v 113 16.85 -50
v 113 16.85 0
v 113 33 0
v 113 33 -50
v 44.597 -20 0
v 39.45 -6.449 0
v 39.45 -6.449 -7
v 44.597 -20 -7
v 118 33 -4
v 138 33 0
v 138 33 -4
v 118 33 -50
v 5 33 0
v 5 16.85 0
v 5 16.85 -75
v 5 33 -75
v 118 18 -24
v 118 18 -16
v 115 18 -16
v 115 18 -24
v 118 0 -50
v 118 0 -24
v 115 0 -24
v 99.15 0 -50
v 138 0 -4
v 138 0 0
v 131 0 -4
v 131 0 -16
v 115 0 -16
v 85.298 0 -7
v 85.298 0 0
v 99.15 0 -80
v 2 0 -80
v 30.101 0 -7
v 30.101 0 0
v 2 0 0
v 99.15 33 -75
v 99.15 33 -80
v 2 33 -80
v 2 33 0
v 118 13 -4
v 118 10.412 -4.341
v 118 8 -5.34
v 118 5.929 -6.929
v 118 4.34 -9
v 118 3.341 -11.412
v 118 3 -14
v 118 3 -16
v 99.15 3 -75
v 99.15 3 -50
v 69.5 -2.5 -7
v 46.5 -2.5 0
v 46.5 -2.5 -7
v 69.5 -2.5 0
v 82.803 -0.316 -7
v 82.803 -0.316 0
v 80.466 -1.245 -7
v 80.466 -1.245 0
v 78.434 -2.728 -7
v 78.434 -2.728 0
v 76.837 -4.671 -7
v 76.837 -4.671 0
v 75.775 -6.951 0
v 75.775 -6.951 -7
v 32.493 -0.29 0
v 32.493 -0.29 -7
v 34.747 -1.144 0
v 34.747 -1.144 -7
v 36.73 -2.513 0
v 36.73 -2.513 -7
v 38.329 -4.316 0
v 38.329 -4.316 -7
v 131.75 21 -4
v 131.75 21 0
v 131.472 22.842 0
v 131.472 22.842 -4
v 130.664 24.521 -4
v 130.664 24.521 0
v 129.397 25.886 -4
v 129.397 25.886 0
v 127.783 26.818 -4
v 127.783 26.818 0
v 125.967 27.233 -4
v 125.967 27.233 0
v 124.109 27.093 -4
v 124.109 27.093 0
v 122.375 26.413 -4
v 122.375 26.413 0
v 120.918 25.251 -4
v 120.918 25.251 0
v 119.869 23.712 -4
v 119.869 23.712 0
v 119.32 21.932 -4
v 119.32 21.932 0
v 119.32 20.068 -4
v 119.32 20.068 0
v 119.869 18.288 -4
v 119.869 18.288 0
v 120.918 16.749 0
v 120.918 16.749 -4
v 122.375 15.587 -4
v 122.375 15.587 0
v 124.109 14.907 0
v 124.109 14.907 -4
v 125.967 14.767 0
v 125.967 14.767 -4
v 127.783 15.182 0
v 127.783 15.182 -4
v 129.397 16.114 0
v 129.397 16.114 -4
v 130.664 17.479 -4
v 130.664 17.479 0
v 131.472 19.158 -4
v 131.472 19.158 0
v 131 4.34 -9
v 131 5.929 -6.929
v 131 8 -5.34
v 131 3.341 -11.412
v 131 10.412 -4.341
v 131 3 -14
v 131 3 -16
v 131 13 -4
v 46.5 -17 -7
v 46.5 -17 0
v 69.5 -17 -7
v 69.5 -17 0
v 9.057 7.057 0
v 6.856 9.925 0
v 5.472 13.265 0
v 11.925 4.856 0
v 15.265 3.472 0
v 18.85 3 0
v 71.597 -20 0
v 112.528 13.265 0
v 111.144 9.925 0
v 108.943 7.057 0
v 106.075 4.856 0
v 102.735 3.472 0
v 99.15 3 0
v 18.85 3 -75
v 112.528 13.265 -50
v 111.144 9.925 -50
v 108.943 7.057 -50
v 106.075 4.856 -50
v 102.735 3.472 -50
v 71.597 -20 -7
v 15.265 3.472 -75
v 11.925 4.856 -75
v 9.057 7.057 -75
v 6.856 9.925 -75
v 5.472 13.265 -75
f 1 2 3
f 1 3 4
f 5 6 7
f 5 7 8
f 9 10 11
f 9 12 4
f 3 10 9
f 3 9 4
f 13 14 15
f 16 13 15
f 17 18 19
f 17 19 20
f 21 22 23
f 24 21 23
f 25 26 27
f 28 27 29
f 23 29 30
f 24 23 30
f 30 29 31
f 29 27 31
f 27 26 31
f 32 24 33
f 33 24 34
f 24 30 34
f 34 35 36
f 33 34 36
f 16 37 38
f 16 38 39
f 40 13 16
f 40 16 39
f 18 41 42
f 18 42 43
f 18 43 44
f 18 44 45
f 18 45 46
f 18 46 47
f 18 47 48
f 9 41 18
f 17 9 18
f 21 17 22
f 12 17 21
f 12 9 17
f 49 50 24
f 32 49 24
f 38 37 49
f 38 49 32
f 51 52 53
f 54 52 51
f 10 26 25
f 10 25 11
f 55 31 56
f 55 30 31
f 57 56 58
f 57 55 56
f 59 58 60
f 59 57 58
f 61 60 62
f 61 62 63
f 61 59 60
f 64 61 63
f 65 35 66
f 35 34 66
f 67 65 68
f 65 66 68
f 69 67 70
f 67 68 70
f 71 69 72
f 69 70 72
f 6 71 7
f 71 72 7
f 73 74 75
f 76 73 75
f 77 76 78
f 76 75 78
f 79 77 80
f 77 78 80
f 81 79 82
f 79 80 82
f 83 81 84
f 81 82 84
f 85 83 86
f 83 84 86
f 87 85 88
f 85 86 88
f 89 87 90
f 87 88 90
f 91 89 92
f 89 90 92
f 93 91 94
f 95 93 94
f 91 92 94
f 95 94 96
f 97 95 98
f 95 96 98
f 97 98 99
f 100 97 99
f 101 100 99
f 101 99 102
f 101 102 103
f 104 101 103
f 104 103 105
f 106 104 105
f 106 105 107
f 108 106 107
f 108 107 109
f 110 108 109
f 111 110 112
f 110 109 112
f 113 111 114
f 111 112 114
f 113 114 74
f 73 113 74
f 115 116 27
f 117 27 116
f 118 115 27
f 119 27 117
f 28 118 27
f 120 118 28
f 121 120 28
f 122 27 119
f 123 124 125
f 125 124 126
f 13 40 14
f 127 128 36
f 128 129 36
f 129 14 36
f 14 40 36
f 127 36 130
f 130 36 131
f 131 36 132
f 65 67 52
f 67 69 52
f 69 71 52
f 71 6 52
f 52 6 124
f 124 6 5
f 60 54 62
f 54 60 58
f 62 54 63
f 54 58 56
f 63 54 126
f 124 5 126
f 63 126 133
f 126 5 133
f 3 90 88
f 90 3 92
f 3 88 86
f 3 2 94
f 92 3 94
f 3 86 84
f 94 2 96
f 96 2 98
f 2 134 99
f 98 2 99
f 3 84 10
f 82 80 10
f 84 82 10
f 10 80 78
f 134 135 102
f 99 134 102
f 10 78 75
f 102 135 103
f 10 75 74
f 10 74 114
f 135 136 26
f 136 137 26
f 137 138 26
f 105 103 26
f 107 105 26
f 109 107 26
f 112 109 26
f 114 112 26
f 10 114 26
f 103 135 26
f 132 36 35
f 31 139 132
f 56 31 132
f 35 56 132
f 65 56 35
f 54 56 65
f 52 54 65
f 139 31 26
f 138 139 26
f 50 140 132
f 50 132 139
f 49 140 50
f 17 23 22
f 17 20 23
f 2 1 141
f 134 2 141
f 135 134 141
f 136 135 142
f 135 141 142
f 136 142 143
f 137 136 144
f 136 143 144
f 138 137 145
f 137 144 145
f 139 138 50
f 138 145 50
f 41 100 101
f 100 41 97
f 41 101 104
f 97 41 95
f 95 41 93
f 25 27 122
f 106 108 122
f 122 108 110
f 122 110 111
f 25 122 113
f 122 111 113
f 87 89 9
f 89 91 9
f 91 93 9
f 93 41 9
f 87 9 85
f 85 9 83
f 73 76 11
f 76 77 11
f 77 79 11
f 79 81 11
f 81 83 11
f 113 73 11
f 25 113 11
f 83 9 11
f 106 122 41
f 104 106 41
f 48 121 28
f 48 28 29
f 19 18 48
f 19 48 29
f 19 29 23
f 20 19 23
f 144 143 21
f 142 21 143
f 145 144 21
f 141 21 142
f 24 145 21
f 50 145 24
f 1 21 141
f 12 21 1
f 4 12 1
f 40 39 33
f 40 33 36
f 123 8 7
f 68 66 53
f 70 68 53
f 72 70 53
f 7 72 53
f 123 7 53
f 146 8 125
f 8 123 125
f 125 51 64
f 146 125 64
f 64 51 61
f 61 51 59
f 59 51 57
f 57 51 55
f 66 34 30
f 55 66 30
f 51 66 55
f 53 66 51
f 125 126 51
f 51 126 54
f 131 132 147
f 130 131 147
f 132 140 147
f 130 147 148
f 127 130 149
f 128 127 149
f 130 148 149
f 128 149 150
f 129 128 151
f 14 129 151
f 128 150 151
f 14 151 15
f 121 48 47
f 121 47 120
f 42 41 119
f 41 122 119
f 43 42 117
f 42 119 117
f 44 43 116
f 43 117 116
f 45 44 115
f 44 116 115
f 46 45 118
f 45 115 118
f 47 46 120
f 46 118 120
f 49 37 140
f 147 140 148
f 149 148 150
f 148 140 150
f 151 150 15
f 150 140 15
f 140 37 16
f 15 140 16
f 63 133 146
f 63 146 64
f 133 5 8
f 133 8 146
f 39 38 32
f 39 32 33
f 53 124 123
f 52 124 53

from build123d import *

# Parameters (mm, degrees)
ESQUISSE1_W             = 138
ESQUISSE1_H             = 75
BOSS_EXTRU_1_DEPTH      = 3
ESQUISSE2_W             = 5
ESQUISSE2_H             = 75
ESQUISSE2_W_2           = 25
BOSS_EXTRU_2_DEPTH      = 30
CONG_1_R                = 13.85
ESQUISSE3_W             = 138
ESQUISSE3_H             = 33
BOSS_EXTRU_3_DEPTH      = 5
ESQUISSE5_W             = 20
ESQUISSE5_H             = 76
ENL_V_MAT_EXTRU_2_DEPTH = 30
ESQUISSE6_R             = 6.25
ENL_V_MAT_EXTRU_3_DEPTH = 4
ESQUISSE7_W             = 20
ESQUISSE7_H             = 3
ENL_V_MAT_EXTRU_4_DEPTH = 30
ENL_V_MAT_EXTRU_5_REACH = 164.89
ESQUISSE8_W             = 18.85
ESQUISSE8_H             = 30
ESQUISSE10_W            = 8
ESQUISSE10_H            = 15
ENL_V_MAT_EXTRU_6_DEPTH = 3
ENL_V_MAT_EXTRU_7_DEPTH = 3
ESQUISSE12_W            = 80
ESQUISSE12_H            = 33
ENL_V_MAT_EXTRU_8_DEPTH = 2
BOSS_EXTRU_4_DEPTH      = 7
ESQUISSE14_W            = 23
ESQUISSE14_H            = 14.5
ENL_V_MAT_EXTRU_9_DEPTH = 7
CONG_2_R                = 10


with BuildPart() as part:
    # Esquisse1 → Boss.-Extru.1 (new body)
    with BuildSketch(Plane(origin=(0, 0, 0), x_dir=(1, 0, 0), z_dir=(0, 1, 0))):
        with Locations((69, 37.5)):
            Rectangle(ESQUISSE1_W, ESQUISSE1_H)
    extrude(amount=BOSS_EXTRU_1_DEPTH)

    # Esquisse2 → Boss.-Extru.2 (add)
    with BuildSketch(Plane(origin=(0, 3, 0), x_dir=(1, 0, 0), z_dir=(0, 1, 0))):
        with Locations((2.5, 37.5)):
            Rectangle(ESQUISSE2_W, ESQUISSE2_H)
        with Locations((125.5, 37.5)):
            Rectangle(ESQUISSE2_W_2, ESQUISSE2_H)
    extrude(amount=BOSS_EXTRU_2_DEPTH)

    # Congé1
    cong_1_edges = [part.edges().sort_by_distance(p)[0] for p in [
        (5, 3, -37.5),
        (113, 3, -37.5),
    ]]
    fillet(cong_1_edges, radius=CONG_1_R)

    # Esquisse3 → Boss.-Extru.3 (add)
    with BuildSketch(Plane(origin=(0, 0, -75), x_dir=(-1, 0, 0), z_dir=(0, 0, -1))):
        with Locations((-69, 16.5)):
            Rectangle(ESQUISSE3_W, ESQUISSE3_H)
    extrude(amount=BOSS_EXTRU_3_DEPTH)

    # Esquisse5 → Enlèv. mat.-Extru.2 (cut)
    with BuildSketch(Plane(origin=(0, 33, 0), x_dir=(1, 0, 0), z_dir=(0, 1, 0))):
        with Locations((128, 42)):
            Rectangle(ESQUISSE5_W, ESQUISSE5_H)
    extrude(amount=-ENL_V_MAT_EXTRU_2_DEPTH, mode=Mode.SUBTRACT)

    # Esquisse6 → Enlèv. mat.-Extru.3 (cut)
    with BuildSketch(Plane.XY):
        with Locations((125.5, 21)):
            Circle(ESQUISSE6_R)
    extrude(amount=-ENL_V_MAT_EXTRU_3_DEPTH, mode=Mode.SUBTRACT)

    # Esquisse7 → Enlèv. mat.-Extru.4 (cut)
    with BuildSketch(Plane(origin=(0, 0, -80), x_dir=(-1, 0, 0), z_dir=(0, 0, -1))):
        with Locations((-128, 1.5)):
            Rectangle(ESQUISSE7_W, ESQUISSE7_H)
    extrude(amount=-ENL_V_MAT_EXTRU_4_DEPTH, mode=Mode.SUBTRACT)

    # Enlèv. mat.-Extru.5: up to this face of the body (flat: up to its plane)
    enl_v_mat_extru_5_end = Plane(part.part.faces().sort_by_distance((65.609195402, 0, -38.563218391))[0])
    # Esquisse8 → Enlèv. mat.-Extru.5 (cut, up to the picked face)
    with BuildSketch(Plane(origin=(0, 33, 0), x_dir=(1, 0, 0), z_dir=(0, 1, 0)), mode=Mode.PRIVATE) as enl_v_mat_extru_5_sk1:
        with Locations((108.575, 65)):
            Rectangle(ESQUISSE8_W, ESQUISSE8_H)
    enl_v_mat_extru_5_tool1 = split(extrude(enl_v_mat_extru_5_sk1.sketch, amount=-ENL_V_MAT_EXTRU_5_REACH, mode=Mode.PRIVATE), bisect_by=enl_v_mat_extru_5_end, keep=Keep.BOTH, mode=Mode.PRIVATE)
    add(enl_v_mat_extru_5_tool1.solids().sort_by(Axis((108.575, 33, -65), (0, -1, 0)))[0], mode=Mode.SUBTRACT)

    # Esquisse10 → Enlèv. mat.-Extru.6 (cut)
    with BuildSketch(Plane(origin=(118, 0, 0), x_dir=(0, 0, -1), z_dir=(1, 0, 0))):
        with Locations((20, 10.5)):
            Rectangle(ESQUISSE10_W, ESQUISSE10_H)
    extrude(amount=-ENL_V_MAT_EXTRU_6_DEPTH, mode=Mode.SUBTRACT)

    # Esquisse11 → Enlèv. mat.-Extru.7 (cut)
    with BuildSketch(Plane(origin=(0, 3, 0), x_dir=(1, 0, 0), z_dir=(0, 1, 0))):
        Polygon((115, 24), (118, 24), (118, 50), (138, 50), (138, 4), (131, 4), (131, 16), (115, 16), align=None)
    extrude(amount=-ENL_V_MAT_EXTRU_7_DEPTH, mode=Mode.SUBTRACT)

    # Esquisse12 → Enlèv. mat.-Extru.8 (cut)
    with BuildSketch(Plane.ZY):
        with Locations((-40, 16.5)):
            Rectangle(ESQUISSE12_W, ESQUISSE12_H)
    extrude(amount=-ENL_V_MAT_EXTRU_8_DEPTH, mode=Mode.SUBTRACT)

    # Esquisse13 → Boss.-Extru.4 (add)
    with BuildSketch(Plane.XY):
        Polygon((37, 0), (44.596875763, -20), (71.596875763, -20), (78, 0), align=None)
    extrude(amount=-BOSS_EXTRU_4_DEPTH)

    # Esquisse14 → Enlèv. mat.-Extru.9 (cut)
    with BuildSketch(Plane.XY):
        with Locations((58, -9.75)):
            Rectangle(ESQUISSE14_W, ESQUISSE14_H)
    extrude(amount=-ENL_V_MAT_EXTRU_9_DEPTH, mode=Mode.SUBTRACT)

    # Congé2
    cong_2_edges = [part.edges().sort_by_distance(p)[0] for p in [
        (37, 0, -3.5),
        (78, 0, -3.5),
        (124.5, 3, -4),
    ]]
    fillet(cong_2_edges, radius=CONG_2_R)


solid = part.part
